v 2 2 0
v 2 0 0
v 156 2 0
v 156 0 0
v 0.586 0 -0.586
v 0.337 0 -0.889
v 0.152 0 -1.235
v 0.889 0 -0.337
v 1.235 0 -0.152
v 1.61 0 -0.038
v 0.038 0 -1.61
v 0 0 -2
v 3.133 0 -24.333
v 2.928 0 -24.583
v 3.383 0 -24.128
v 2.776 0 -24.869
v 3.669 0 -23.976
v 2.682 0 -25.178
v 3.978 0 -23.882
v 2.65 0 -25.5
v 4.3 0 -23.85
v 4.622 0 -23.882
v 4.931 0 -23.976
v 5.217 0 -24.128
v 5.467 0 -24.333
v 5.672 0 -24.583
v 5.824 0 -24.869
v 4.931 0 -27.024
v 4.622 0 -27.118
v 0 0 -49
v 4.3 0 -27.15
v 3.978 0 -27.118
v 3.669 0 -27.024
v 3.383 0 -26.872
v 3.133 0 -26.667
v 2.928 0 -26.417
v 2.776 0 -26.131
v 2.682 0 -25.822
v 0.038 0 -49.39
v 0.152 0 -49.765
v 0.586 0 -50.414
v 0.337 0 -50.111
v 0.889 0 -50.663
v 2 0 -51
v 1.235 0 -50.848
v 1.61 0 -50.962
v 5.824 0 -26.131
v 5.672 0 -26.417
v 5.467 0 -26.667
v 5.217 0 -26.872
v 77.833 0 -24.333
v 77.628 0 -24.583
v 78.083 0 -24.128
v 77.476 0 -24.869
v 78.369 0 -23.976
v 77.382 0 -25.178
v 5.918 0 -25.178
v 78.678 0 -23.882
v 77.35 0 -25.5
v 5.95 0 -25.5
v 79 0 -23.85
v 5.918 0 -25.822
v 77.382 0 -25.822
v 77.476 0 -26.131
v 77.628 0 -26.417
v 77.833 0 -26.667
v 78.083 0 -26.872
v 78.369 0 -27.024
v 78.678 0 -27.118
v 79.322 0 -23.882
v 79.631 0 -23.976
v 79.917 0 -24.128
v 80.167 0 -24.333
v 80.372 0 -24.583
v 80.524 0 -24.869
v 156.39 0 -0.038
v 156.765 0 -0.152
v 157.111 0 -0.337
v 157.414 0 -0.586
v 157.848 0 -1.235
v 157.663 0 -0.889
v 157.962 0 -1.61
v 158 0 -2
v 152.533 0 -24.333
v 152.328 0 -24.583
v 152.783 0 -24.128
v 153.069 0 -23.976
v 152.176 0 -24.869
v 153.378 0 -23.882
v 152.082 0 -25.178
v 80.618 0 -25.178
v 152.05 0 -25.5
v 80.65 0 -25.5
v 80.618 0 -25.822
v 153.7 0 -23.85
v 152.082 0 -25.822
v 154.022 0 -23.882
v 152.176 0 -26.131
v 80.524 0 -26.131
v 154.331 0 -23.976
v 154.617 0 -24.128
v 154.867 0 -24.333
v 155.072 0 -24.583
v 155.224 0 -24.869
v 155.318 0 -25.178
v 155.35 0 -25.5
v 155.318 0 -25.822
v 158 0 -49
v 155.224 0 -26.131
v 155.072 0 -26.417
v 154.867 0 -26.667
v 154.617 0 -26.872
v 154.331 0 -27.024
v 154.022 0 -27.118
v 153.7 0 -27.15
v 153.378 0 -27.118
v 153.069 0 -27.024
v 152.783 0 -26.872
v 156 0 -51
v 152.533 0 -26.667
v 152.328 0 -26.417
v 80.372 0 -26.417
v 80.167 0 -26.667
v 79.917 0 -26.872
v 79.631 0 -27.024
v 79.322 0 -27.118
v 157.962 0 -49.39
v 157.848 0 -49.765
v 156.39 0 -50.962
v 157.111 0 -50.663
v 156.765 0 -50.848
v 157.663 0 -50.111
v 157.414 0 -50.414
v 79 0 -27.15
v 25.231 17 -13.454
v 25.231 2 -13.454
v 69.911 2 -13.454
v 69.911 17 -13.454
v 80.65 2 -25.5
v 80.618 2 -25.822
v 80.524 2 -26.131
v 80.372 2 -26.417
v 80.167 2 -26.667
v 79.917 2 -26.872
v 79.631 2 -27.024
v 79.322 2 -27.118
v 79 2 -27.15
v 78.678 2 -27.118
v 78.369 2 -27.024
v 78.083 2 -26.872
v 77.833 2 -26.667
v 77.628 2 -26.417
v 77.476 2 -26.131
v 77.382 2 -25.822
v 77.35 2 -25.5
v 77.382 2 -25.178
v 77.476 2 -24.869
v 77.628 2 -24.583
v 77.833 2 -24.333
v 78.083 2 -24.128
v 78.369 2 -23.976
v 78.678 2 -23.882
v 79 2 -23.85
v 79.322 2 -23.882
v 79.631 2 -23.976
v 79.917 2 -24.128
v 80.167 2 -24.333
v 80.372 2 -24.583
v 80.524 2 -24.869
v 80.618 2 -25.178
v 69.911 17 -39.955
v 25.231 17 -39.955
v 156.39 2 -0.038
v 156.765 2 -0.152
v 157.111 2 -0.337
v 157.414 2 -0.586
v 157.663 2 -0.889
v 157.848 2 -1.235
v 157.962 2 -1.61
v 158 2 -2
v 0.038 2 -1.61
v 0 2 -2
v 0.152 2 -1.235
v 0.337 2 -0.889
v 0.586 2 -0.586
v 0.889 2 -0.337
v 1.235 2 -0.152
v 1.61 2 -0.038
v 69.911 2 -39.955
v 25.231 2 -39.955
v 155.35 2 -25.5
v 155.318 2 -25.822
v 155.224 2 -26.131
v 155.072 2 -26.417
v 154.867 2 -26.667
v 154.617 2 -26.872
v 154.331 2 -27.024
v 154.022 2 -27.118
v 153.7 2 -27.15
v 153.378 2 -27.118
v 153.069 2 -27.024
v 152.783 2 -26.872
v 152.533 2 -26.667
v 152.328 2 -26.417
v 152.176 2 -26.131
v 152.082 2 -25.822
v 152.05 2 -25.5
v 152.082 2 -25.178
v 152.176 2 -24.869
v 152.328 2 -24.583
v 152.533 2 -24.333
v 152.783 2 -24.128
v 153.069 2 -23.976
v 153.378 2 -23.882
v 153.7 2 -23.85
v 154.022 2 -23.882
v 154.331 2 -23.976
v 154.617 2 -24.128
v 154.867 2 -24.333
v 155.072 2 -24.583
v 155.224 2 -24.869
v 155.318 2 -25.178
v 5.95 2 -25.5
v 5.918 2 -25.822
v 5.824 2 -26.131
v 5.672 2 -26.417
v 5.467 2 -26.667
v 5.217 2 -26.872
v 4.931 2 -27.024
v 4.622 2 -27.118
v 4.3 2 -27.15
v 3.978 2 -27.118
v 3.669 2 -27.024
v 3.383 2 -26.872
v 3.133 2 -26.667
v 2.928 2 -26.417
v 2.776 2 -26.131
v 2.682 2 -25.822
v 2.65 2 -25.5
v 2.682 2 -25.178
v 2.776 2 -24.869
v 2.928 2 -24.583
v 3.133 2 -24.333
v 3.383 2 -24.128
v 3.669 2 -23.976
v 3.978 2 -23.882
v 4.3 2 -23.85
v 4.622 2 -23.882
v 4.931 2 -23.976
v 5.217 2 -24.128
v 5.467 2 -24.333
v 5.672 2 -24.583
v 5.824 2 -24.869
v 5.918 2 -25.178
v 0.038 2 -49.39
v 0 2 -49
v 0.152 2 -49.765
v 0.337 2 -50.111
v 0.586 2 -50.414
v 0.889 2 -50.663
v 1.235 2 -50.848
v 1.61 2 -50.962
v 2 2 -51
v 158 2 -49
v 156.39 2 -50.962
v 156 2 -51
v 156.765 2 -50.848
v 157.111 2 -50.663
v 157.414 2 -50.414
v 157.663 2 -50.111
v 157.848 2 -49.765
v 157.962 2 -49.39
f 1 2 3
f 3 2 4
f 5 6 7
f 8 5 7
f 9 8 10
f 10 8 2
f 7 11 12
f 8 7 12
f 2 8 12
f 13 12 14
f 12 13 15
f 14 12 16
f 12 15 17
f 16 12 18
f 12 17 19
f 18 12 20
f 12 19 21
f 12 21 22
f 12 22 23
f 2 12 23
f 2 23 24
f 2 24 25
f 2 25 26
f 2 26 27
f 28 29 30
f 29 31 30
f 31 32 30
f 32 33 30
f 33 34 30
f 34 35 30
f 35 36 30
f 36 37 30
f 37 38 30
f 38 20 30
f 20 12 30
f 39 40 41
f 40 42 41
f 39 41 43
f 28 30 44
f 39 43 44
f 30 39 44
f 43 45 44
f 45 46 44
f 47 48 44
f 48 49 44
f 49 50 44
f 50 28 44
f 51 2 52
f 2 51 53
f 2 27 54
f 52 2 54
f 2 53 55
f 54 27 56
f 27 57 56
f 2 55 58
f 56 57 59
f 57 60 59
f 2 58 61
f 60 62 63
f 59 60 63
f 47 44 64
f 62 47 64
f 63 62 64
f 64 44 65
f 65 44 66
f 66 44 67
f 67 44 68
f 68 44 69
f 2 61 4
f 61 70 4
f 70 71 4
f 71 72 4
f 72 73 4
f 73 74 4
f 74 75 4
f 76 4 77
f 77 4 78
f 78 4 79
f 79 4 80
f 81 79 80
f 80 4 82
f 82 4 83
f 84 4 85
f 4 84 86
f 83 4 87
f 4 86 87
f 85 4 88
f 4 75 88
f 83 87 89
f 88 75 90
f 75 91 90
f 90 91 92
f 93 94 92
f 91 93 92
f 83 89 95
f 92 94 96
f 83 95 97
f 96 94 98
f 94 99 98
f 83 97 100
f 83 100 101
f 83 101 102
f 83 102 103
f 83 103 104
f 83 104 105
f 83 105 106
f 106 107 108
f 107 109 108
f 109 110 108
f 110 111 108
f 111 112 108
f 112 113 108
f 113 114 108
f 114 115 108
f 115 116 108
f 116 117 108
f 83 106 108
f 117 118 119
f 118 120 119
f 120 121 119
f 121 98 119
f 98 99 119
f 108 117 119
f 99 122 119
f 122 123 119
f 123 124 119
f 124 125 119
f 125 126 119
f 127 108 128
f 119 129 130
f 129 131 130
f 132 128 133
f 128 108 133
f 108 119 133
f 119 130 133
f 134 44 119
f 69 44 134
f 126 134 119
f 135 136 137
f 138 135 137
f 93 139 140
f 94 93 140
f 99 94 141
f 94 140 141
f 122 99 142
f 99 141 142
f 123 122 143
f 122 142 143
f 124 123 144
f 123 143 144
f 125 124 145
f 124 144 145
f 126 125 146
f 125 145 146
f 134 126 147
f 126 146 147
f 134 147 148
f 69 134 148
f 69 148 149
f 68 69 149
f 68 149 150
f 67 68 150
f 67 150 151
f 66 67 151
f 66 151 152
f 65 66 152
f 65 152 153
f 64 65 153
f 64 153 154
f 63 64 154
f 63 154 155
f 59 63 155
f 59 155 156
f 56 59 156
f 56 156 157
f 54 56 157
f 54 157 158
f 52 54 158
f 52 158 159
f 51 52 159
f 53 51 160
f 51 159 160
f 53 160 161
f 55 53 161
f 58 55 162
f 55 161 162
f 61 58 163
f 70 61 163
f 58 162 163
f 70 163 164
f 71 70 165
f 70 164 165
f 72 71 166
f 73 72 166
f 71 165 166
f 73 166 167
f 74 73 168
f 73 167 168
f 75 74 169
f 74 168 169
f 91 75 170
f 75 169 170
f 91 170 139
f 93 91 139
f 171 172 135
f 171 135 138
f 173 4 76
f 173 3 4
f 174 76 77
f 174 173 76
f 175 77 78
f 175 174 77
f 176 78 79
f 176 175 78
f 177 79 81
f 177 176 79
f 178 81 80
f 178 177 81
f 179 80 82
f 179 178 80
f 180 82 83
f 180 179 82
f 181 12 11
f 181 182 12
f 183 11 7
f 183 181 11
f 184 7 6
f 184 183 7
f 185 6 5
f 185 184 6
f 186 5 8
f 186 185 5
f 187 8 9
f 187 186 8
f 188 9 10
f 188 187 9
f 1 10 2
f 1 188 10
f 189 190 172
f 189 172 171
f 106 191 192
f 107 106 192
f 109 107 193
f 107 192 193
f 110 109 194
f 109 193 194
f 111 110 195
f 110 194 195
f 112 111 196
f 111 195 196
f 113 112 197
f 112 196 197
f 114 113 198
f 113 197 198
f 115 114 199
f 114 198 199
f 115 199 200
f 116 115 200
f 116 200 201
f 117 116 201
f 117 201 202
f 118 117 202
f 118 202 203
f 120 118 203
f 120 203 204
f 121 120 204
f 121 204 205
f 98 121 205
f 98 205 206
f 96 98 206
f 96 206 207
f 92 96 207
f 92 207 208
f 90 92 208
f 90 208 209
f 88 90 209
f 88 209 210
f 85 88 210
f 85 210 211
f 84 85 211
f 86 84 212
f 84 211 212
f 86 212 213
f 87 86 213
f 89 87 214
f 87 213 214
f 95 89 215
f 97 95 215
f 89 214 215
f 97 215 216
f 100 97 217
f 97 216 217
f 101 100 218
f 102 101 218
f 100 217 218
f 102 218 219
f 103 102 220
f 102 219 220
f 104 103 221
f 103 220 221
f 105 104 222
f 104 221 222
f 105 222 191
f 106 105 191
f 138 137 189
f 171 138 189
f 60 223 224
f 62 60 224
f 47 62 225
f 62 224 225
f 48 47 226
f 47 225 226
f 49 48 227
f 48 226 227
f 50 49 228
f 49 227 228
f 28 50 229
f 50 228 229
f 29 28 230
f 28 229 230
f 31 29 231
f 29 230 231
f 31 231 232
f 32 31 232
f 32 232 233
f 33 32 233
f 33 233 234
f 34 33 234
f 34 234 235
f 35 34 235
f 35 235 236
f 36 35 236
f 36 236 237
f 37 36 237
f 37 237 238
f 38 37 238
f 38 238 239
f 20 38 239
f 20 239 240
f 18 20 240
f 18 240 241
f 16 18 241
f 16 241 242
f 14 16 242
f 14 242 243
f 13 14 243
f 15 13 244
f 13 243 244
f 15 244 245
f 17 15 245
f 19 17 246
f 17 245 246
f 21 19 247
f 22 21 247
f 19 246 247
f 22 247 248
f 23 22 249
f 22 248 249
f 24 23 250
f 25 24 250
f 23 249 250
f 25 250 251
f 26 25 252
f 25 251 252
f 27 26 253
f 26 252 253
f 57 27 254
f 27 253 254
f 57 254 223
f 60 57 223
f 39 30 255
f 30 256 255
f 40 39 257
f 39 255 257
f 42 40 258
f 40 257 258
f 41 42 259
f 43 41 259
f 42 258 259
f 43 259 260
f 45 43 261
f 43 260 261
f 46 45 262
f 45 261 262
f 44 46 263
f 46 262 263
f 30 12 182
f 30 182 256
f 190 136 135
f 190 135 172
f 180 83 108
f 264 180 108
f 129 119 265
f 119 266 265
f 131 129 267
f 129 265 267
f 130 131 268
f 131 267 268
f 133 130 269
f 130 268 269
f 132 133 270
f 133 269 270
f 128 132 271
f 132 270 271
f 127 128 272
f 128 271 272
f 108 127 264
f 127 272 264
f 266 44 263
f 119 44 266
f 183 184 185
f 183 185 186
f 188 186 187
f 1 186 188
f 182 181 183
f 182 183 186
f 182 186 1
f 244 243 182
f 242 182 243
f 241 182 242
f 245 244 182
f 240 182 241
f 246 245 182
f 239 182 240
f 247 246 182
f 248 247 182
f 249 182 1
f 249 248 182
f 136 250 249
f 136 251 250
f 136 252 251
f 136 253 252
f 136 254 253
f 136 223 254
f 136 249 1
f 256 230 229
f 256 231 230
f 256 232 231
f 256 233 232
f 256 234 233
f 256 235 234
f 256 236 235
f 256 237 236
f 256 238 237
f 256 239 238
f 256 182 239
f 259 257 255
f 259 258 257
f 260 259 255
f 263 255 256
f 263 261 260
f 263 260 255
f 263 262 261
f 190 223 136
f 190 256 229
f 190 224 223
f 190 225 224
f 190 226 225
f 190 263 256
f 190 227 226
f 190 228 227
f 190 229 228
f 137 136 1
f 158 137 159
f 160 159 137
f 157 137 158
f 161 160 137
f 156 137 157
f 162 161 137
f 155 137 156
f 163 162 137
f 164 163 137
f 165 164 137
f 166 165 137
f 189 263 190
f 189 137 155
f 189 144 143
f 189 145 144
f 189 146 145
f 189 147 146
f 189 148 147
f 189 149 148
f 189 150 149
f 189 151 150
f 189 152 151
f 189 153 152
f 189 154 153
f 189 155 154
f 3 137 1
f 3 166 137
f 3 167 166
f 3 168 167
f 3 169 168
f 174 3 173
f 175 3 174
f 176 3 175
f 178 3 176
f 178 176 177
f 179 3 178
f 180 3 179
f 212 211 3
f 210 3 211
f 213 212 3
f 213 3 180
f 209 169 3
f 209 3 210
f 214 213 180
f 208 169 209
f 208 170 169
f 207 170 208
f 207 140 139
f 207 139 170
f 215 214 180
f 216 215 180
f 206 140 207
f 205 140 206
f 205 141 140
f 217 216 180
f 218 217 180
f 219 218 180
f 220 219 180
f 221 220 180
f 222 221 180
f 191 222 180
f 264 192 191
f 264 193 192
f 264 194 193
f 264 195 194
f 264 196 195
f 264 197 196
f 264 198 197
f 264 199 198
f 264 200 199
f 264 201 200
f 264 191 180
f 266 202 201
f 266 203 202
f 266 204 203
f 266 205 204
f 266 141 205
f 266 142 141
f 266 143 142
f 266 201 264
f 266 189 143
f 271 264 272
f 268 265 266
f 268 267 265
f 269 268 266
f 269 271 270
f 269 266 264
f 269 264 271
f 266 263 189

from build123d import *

# Parameters (mm, degrees)
SKETCH1_W           = 158
SKETCH1_H           = 51
BOSS_EXTRUDE1_DEPTH = 2
SKETCH2_R           = 1.65
CUT_EXTRUDE1_DEPTH  = 3
FILLET1_R           = 2
SKETCH3_W           = 44.679431241
SKETCH3_H           = 26.501035196
BOSS_EXTRUDE2_DEPTH = 15


with BuildPart() as part:
    # Sketch1 → Boss-Extrude1 (new body)
    with BuildSketch(Plane(origin=(0, 0, 0), x_dir=(1, 0, 0), z_dir=(0, 1, 0))):
        with Locations((79, 25.5)):
            Rectangle(SKETCH1_W, SKETCH1_H)
    extrude(amount=BOSS_EXTRUDE1_DEPTH)

    # Sketch2 → Cut-Extrude1 (cut, through all)
    with BuildSketch(Plane(origin=(0, 2, 0), x_dir=(1, 0, 0), z_dir=(0, 1, 0))):
        with Locations((4.3, 25.5)):
            Circle(SKETCH2_R)
        with Locations((153.7, 25.5)):
            Circle(SKETCH2_R)
        with Locations((79, 25.5)):
            Circle(SKETCH2_R)
    extrude(amount=-CUT_EXTRUDE1_DEPTH, mode=Mode.SUBTRACT)

    # Fillet1
    fillet1_edges = [part.edges().sort_by_distance(p)[0] for p in [
        (0, 1, -51),
        (158, 1, -51),
        (158, 1, 0),
        (0, 1, 0),
    ]]
    fillet(fillet1_edges, radius=FILLET1_R)

    # Sketch3 → Boss-Extrude2 (add)
    with BuildSketch(Plane(origin=(0, 2, 0), x_dir=(1, 0, 0), z_dir=(0, 1, 0))):
        with Locations((47.571086358, 26.704592509)):
            Rectangle(SKETCH3_W, SKETCH3_H)
    extrude(amount=BOSS_EXTRUDE2_DEPTH)


solid = part.part
